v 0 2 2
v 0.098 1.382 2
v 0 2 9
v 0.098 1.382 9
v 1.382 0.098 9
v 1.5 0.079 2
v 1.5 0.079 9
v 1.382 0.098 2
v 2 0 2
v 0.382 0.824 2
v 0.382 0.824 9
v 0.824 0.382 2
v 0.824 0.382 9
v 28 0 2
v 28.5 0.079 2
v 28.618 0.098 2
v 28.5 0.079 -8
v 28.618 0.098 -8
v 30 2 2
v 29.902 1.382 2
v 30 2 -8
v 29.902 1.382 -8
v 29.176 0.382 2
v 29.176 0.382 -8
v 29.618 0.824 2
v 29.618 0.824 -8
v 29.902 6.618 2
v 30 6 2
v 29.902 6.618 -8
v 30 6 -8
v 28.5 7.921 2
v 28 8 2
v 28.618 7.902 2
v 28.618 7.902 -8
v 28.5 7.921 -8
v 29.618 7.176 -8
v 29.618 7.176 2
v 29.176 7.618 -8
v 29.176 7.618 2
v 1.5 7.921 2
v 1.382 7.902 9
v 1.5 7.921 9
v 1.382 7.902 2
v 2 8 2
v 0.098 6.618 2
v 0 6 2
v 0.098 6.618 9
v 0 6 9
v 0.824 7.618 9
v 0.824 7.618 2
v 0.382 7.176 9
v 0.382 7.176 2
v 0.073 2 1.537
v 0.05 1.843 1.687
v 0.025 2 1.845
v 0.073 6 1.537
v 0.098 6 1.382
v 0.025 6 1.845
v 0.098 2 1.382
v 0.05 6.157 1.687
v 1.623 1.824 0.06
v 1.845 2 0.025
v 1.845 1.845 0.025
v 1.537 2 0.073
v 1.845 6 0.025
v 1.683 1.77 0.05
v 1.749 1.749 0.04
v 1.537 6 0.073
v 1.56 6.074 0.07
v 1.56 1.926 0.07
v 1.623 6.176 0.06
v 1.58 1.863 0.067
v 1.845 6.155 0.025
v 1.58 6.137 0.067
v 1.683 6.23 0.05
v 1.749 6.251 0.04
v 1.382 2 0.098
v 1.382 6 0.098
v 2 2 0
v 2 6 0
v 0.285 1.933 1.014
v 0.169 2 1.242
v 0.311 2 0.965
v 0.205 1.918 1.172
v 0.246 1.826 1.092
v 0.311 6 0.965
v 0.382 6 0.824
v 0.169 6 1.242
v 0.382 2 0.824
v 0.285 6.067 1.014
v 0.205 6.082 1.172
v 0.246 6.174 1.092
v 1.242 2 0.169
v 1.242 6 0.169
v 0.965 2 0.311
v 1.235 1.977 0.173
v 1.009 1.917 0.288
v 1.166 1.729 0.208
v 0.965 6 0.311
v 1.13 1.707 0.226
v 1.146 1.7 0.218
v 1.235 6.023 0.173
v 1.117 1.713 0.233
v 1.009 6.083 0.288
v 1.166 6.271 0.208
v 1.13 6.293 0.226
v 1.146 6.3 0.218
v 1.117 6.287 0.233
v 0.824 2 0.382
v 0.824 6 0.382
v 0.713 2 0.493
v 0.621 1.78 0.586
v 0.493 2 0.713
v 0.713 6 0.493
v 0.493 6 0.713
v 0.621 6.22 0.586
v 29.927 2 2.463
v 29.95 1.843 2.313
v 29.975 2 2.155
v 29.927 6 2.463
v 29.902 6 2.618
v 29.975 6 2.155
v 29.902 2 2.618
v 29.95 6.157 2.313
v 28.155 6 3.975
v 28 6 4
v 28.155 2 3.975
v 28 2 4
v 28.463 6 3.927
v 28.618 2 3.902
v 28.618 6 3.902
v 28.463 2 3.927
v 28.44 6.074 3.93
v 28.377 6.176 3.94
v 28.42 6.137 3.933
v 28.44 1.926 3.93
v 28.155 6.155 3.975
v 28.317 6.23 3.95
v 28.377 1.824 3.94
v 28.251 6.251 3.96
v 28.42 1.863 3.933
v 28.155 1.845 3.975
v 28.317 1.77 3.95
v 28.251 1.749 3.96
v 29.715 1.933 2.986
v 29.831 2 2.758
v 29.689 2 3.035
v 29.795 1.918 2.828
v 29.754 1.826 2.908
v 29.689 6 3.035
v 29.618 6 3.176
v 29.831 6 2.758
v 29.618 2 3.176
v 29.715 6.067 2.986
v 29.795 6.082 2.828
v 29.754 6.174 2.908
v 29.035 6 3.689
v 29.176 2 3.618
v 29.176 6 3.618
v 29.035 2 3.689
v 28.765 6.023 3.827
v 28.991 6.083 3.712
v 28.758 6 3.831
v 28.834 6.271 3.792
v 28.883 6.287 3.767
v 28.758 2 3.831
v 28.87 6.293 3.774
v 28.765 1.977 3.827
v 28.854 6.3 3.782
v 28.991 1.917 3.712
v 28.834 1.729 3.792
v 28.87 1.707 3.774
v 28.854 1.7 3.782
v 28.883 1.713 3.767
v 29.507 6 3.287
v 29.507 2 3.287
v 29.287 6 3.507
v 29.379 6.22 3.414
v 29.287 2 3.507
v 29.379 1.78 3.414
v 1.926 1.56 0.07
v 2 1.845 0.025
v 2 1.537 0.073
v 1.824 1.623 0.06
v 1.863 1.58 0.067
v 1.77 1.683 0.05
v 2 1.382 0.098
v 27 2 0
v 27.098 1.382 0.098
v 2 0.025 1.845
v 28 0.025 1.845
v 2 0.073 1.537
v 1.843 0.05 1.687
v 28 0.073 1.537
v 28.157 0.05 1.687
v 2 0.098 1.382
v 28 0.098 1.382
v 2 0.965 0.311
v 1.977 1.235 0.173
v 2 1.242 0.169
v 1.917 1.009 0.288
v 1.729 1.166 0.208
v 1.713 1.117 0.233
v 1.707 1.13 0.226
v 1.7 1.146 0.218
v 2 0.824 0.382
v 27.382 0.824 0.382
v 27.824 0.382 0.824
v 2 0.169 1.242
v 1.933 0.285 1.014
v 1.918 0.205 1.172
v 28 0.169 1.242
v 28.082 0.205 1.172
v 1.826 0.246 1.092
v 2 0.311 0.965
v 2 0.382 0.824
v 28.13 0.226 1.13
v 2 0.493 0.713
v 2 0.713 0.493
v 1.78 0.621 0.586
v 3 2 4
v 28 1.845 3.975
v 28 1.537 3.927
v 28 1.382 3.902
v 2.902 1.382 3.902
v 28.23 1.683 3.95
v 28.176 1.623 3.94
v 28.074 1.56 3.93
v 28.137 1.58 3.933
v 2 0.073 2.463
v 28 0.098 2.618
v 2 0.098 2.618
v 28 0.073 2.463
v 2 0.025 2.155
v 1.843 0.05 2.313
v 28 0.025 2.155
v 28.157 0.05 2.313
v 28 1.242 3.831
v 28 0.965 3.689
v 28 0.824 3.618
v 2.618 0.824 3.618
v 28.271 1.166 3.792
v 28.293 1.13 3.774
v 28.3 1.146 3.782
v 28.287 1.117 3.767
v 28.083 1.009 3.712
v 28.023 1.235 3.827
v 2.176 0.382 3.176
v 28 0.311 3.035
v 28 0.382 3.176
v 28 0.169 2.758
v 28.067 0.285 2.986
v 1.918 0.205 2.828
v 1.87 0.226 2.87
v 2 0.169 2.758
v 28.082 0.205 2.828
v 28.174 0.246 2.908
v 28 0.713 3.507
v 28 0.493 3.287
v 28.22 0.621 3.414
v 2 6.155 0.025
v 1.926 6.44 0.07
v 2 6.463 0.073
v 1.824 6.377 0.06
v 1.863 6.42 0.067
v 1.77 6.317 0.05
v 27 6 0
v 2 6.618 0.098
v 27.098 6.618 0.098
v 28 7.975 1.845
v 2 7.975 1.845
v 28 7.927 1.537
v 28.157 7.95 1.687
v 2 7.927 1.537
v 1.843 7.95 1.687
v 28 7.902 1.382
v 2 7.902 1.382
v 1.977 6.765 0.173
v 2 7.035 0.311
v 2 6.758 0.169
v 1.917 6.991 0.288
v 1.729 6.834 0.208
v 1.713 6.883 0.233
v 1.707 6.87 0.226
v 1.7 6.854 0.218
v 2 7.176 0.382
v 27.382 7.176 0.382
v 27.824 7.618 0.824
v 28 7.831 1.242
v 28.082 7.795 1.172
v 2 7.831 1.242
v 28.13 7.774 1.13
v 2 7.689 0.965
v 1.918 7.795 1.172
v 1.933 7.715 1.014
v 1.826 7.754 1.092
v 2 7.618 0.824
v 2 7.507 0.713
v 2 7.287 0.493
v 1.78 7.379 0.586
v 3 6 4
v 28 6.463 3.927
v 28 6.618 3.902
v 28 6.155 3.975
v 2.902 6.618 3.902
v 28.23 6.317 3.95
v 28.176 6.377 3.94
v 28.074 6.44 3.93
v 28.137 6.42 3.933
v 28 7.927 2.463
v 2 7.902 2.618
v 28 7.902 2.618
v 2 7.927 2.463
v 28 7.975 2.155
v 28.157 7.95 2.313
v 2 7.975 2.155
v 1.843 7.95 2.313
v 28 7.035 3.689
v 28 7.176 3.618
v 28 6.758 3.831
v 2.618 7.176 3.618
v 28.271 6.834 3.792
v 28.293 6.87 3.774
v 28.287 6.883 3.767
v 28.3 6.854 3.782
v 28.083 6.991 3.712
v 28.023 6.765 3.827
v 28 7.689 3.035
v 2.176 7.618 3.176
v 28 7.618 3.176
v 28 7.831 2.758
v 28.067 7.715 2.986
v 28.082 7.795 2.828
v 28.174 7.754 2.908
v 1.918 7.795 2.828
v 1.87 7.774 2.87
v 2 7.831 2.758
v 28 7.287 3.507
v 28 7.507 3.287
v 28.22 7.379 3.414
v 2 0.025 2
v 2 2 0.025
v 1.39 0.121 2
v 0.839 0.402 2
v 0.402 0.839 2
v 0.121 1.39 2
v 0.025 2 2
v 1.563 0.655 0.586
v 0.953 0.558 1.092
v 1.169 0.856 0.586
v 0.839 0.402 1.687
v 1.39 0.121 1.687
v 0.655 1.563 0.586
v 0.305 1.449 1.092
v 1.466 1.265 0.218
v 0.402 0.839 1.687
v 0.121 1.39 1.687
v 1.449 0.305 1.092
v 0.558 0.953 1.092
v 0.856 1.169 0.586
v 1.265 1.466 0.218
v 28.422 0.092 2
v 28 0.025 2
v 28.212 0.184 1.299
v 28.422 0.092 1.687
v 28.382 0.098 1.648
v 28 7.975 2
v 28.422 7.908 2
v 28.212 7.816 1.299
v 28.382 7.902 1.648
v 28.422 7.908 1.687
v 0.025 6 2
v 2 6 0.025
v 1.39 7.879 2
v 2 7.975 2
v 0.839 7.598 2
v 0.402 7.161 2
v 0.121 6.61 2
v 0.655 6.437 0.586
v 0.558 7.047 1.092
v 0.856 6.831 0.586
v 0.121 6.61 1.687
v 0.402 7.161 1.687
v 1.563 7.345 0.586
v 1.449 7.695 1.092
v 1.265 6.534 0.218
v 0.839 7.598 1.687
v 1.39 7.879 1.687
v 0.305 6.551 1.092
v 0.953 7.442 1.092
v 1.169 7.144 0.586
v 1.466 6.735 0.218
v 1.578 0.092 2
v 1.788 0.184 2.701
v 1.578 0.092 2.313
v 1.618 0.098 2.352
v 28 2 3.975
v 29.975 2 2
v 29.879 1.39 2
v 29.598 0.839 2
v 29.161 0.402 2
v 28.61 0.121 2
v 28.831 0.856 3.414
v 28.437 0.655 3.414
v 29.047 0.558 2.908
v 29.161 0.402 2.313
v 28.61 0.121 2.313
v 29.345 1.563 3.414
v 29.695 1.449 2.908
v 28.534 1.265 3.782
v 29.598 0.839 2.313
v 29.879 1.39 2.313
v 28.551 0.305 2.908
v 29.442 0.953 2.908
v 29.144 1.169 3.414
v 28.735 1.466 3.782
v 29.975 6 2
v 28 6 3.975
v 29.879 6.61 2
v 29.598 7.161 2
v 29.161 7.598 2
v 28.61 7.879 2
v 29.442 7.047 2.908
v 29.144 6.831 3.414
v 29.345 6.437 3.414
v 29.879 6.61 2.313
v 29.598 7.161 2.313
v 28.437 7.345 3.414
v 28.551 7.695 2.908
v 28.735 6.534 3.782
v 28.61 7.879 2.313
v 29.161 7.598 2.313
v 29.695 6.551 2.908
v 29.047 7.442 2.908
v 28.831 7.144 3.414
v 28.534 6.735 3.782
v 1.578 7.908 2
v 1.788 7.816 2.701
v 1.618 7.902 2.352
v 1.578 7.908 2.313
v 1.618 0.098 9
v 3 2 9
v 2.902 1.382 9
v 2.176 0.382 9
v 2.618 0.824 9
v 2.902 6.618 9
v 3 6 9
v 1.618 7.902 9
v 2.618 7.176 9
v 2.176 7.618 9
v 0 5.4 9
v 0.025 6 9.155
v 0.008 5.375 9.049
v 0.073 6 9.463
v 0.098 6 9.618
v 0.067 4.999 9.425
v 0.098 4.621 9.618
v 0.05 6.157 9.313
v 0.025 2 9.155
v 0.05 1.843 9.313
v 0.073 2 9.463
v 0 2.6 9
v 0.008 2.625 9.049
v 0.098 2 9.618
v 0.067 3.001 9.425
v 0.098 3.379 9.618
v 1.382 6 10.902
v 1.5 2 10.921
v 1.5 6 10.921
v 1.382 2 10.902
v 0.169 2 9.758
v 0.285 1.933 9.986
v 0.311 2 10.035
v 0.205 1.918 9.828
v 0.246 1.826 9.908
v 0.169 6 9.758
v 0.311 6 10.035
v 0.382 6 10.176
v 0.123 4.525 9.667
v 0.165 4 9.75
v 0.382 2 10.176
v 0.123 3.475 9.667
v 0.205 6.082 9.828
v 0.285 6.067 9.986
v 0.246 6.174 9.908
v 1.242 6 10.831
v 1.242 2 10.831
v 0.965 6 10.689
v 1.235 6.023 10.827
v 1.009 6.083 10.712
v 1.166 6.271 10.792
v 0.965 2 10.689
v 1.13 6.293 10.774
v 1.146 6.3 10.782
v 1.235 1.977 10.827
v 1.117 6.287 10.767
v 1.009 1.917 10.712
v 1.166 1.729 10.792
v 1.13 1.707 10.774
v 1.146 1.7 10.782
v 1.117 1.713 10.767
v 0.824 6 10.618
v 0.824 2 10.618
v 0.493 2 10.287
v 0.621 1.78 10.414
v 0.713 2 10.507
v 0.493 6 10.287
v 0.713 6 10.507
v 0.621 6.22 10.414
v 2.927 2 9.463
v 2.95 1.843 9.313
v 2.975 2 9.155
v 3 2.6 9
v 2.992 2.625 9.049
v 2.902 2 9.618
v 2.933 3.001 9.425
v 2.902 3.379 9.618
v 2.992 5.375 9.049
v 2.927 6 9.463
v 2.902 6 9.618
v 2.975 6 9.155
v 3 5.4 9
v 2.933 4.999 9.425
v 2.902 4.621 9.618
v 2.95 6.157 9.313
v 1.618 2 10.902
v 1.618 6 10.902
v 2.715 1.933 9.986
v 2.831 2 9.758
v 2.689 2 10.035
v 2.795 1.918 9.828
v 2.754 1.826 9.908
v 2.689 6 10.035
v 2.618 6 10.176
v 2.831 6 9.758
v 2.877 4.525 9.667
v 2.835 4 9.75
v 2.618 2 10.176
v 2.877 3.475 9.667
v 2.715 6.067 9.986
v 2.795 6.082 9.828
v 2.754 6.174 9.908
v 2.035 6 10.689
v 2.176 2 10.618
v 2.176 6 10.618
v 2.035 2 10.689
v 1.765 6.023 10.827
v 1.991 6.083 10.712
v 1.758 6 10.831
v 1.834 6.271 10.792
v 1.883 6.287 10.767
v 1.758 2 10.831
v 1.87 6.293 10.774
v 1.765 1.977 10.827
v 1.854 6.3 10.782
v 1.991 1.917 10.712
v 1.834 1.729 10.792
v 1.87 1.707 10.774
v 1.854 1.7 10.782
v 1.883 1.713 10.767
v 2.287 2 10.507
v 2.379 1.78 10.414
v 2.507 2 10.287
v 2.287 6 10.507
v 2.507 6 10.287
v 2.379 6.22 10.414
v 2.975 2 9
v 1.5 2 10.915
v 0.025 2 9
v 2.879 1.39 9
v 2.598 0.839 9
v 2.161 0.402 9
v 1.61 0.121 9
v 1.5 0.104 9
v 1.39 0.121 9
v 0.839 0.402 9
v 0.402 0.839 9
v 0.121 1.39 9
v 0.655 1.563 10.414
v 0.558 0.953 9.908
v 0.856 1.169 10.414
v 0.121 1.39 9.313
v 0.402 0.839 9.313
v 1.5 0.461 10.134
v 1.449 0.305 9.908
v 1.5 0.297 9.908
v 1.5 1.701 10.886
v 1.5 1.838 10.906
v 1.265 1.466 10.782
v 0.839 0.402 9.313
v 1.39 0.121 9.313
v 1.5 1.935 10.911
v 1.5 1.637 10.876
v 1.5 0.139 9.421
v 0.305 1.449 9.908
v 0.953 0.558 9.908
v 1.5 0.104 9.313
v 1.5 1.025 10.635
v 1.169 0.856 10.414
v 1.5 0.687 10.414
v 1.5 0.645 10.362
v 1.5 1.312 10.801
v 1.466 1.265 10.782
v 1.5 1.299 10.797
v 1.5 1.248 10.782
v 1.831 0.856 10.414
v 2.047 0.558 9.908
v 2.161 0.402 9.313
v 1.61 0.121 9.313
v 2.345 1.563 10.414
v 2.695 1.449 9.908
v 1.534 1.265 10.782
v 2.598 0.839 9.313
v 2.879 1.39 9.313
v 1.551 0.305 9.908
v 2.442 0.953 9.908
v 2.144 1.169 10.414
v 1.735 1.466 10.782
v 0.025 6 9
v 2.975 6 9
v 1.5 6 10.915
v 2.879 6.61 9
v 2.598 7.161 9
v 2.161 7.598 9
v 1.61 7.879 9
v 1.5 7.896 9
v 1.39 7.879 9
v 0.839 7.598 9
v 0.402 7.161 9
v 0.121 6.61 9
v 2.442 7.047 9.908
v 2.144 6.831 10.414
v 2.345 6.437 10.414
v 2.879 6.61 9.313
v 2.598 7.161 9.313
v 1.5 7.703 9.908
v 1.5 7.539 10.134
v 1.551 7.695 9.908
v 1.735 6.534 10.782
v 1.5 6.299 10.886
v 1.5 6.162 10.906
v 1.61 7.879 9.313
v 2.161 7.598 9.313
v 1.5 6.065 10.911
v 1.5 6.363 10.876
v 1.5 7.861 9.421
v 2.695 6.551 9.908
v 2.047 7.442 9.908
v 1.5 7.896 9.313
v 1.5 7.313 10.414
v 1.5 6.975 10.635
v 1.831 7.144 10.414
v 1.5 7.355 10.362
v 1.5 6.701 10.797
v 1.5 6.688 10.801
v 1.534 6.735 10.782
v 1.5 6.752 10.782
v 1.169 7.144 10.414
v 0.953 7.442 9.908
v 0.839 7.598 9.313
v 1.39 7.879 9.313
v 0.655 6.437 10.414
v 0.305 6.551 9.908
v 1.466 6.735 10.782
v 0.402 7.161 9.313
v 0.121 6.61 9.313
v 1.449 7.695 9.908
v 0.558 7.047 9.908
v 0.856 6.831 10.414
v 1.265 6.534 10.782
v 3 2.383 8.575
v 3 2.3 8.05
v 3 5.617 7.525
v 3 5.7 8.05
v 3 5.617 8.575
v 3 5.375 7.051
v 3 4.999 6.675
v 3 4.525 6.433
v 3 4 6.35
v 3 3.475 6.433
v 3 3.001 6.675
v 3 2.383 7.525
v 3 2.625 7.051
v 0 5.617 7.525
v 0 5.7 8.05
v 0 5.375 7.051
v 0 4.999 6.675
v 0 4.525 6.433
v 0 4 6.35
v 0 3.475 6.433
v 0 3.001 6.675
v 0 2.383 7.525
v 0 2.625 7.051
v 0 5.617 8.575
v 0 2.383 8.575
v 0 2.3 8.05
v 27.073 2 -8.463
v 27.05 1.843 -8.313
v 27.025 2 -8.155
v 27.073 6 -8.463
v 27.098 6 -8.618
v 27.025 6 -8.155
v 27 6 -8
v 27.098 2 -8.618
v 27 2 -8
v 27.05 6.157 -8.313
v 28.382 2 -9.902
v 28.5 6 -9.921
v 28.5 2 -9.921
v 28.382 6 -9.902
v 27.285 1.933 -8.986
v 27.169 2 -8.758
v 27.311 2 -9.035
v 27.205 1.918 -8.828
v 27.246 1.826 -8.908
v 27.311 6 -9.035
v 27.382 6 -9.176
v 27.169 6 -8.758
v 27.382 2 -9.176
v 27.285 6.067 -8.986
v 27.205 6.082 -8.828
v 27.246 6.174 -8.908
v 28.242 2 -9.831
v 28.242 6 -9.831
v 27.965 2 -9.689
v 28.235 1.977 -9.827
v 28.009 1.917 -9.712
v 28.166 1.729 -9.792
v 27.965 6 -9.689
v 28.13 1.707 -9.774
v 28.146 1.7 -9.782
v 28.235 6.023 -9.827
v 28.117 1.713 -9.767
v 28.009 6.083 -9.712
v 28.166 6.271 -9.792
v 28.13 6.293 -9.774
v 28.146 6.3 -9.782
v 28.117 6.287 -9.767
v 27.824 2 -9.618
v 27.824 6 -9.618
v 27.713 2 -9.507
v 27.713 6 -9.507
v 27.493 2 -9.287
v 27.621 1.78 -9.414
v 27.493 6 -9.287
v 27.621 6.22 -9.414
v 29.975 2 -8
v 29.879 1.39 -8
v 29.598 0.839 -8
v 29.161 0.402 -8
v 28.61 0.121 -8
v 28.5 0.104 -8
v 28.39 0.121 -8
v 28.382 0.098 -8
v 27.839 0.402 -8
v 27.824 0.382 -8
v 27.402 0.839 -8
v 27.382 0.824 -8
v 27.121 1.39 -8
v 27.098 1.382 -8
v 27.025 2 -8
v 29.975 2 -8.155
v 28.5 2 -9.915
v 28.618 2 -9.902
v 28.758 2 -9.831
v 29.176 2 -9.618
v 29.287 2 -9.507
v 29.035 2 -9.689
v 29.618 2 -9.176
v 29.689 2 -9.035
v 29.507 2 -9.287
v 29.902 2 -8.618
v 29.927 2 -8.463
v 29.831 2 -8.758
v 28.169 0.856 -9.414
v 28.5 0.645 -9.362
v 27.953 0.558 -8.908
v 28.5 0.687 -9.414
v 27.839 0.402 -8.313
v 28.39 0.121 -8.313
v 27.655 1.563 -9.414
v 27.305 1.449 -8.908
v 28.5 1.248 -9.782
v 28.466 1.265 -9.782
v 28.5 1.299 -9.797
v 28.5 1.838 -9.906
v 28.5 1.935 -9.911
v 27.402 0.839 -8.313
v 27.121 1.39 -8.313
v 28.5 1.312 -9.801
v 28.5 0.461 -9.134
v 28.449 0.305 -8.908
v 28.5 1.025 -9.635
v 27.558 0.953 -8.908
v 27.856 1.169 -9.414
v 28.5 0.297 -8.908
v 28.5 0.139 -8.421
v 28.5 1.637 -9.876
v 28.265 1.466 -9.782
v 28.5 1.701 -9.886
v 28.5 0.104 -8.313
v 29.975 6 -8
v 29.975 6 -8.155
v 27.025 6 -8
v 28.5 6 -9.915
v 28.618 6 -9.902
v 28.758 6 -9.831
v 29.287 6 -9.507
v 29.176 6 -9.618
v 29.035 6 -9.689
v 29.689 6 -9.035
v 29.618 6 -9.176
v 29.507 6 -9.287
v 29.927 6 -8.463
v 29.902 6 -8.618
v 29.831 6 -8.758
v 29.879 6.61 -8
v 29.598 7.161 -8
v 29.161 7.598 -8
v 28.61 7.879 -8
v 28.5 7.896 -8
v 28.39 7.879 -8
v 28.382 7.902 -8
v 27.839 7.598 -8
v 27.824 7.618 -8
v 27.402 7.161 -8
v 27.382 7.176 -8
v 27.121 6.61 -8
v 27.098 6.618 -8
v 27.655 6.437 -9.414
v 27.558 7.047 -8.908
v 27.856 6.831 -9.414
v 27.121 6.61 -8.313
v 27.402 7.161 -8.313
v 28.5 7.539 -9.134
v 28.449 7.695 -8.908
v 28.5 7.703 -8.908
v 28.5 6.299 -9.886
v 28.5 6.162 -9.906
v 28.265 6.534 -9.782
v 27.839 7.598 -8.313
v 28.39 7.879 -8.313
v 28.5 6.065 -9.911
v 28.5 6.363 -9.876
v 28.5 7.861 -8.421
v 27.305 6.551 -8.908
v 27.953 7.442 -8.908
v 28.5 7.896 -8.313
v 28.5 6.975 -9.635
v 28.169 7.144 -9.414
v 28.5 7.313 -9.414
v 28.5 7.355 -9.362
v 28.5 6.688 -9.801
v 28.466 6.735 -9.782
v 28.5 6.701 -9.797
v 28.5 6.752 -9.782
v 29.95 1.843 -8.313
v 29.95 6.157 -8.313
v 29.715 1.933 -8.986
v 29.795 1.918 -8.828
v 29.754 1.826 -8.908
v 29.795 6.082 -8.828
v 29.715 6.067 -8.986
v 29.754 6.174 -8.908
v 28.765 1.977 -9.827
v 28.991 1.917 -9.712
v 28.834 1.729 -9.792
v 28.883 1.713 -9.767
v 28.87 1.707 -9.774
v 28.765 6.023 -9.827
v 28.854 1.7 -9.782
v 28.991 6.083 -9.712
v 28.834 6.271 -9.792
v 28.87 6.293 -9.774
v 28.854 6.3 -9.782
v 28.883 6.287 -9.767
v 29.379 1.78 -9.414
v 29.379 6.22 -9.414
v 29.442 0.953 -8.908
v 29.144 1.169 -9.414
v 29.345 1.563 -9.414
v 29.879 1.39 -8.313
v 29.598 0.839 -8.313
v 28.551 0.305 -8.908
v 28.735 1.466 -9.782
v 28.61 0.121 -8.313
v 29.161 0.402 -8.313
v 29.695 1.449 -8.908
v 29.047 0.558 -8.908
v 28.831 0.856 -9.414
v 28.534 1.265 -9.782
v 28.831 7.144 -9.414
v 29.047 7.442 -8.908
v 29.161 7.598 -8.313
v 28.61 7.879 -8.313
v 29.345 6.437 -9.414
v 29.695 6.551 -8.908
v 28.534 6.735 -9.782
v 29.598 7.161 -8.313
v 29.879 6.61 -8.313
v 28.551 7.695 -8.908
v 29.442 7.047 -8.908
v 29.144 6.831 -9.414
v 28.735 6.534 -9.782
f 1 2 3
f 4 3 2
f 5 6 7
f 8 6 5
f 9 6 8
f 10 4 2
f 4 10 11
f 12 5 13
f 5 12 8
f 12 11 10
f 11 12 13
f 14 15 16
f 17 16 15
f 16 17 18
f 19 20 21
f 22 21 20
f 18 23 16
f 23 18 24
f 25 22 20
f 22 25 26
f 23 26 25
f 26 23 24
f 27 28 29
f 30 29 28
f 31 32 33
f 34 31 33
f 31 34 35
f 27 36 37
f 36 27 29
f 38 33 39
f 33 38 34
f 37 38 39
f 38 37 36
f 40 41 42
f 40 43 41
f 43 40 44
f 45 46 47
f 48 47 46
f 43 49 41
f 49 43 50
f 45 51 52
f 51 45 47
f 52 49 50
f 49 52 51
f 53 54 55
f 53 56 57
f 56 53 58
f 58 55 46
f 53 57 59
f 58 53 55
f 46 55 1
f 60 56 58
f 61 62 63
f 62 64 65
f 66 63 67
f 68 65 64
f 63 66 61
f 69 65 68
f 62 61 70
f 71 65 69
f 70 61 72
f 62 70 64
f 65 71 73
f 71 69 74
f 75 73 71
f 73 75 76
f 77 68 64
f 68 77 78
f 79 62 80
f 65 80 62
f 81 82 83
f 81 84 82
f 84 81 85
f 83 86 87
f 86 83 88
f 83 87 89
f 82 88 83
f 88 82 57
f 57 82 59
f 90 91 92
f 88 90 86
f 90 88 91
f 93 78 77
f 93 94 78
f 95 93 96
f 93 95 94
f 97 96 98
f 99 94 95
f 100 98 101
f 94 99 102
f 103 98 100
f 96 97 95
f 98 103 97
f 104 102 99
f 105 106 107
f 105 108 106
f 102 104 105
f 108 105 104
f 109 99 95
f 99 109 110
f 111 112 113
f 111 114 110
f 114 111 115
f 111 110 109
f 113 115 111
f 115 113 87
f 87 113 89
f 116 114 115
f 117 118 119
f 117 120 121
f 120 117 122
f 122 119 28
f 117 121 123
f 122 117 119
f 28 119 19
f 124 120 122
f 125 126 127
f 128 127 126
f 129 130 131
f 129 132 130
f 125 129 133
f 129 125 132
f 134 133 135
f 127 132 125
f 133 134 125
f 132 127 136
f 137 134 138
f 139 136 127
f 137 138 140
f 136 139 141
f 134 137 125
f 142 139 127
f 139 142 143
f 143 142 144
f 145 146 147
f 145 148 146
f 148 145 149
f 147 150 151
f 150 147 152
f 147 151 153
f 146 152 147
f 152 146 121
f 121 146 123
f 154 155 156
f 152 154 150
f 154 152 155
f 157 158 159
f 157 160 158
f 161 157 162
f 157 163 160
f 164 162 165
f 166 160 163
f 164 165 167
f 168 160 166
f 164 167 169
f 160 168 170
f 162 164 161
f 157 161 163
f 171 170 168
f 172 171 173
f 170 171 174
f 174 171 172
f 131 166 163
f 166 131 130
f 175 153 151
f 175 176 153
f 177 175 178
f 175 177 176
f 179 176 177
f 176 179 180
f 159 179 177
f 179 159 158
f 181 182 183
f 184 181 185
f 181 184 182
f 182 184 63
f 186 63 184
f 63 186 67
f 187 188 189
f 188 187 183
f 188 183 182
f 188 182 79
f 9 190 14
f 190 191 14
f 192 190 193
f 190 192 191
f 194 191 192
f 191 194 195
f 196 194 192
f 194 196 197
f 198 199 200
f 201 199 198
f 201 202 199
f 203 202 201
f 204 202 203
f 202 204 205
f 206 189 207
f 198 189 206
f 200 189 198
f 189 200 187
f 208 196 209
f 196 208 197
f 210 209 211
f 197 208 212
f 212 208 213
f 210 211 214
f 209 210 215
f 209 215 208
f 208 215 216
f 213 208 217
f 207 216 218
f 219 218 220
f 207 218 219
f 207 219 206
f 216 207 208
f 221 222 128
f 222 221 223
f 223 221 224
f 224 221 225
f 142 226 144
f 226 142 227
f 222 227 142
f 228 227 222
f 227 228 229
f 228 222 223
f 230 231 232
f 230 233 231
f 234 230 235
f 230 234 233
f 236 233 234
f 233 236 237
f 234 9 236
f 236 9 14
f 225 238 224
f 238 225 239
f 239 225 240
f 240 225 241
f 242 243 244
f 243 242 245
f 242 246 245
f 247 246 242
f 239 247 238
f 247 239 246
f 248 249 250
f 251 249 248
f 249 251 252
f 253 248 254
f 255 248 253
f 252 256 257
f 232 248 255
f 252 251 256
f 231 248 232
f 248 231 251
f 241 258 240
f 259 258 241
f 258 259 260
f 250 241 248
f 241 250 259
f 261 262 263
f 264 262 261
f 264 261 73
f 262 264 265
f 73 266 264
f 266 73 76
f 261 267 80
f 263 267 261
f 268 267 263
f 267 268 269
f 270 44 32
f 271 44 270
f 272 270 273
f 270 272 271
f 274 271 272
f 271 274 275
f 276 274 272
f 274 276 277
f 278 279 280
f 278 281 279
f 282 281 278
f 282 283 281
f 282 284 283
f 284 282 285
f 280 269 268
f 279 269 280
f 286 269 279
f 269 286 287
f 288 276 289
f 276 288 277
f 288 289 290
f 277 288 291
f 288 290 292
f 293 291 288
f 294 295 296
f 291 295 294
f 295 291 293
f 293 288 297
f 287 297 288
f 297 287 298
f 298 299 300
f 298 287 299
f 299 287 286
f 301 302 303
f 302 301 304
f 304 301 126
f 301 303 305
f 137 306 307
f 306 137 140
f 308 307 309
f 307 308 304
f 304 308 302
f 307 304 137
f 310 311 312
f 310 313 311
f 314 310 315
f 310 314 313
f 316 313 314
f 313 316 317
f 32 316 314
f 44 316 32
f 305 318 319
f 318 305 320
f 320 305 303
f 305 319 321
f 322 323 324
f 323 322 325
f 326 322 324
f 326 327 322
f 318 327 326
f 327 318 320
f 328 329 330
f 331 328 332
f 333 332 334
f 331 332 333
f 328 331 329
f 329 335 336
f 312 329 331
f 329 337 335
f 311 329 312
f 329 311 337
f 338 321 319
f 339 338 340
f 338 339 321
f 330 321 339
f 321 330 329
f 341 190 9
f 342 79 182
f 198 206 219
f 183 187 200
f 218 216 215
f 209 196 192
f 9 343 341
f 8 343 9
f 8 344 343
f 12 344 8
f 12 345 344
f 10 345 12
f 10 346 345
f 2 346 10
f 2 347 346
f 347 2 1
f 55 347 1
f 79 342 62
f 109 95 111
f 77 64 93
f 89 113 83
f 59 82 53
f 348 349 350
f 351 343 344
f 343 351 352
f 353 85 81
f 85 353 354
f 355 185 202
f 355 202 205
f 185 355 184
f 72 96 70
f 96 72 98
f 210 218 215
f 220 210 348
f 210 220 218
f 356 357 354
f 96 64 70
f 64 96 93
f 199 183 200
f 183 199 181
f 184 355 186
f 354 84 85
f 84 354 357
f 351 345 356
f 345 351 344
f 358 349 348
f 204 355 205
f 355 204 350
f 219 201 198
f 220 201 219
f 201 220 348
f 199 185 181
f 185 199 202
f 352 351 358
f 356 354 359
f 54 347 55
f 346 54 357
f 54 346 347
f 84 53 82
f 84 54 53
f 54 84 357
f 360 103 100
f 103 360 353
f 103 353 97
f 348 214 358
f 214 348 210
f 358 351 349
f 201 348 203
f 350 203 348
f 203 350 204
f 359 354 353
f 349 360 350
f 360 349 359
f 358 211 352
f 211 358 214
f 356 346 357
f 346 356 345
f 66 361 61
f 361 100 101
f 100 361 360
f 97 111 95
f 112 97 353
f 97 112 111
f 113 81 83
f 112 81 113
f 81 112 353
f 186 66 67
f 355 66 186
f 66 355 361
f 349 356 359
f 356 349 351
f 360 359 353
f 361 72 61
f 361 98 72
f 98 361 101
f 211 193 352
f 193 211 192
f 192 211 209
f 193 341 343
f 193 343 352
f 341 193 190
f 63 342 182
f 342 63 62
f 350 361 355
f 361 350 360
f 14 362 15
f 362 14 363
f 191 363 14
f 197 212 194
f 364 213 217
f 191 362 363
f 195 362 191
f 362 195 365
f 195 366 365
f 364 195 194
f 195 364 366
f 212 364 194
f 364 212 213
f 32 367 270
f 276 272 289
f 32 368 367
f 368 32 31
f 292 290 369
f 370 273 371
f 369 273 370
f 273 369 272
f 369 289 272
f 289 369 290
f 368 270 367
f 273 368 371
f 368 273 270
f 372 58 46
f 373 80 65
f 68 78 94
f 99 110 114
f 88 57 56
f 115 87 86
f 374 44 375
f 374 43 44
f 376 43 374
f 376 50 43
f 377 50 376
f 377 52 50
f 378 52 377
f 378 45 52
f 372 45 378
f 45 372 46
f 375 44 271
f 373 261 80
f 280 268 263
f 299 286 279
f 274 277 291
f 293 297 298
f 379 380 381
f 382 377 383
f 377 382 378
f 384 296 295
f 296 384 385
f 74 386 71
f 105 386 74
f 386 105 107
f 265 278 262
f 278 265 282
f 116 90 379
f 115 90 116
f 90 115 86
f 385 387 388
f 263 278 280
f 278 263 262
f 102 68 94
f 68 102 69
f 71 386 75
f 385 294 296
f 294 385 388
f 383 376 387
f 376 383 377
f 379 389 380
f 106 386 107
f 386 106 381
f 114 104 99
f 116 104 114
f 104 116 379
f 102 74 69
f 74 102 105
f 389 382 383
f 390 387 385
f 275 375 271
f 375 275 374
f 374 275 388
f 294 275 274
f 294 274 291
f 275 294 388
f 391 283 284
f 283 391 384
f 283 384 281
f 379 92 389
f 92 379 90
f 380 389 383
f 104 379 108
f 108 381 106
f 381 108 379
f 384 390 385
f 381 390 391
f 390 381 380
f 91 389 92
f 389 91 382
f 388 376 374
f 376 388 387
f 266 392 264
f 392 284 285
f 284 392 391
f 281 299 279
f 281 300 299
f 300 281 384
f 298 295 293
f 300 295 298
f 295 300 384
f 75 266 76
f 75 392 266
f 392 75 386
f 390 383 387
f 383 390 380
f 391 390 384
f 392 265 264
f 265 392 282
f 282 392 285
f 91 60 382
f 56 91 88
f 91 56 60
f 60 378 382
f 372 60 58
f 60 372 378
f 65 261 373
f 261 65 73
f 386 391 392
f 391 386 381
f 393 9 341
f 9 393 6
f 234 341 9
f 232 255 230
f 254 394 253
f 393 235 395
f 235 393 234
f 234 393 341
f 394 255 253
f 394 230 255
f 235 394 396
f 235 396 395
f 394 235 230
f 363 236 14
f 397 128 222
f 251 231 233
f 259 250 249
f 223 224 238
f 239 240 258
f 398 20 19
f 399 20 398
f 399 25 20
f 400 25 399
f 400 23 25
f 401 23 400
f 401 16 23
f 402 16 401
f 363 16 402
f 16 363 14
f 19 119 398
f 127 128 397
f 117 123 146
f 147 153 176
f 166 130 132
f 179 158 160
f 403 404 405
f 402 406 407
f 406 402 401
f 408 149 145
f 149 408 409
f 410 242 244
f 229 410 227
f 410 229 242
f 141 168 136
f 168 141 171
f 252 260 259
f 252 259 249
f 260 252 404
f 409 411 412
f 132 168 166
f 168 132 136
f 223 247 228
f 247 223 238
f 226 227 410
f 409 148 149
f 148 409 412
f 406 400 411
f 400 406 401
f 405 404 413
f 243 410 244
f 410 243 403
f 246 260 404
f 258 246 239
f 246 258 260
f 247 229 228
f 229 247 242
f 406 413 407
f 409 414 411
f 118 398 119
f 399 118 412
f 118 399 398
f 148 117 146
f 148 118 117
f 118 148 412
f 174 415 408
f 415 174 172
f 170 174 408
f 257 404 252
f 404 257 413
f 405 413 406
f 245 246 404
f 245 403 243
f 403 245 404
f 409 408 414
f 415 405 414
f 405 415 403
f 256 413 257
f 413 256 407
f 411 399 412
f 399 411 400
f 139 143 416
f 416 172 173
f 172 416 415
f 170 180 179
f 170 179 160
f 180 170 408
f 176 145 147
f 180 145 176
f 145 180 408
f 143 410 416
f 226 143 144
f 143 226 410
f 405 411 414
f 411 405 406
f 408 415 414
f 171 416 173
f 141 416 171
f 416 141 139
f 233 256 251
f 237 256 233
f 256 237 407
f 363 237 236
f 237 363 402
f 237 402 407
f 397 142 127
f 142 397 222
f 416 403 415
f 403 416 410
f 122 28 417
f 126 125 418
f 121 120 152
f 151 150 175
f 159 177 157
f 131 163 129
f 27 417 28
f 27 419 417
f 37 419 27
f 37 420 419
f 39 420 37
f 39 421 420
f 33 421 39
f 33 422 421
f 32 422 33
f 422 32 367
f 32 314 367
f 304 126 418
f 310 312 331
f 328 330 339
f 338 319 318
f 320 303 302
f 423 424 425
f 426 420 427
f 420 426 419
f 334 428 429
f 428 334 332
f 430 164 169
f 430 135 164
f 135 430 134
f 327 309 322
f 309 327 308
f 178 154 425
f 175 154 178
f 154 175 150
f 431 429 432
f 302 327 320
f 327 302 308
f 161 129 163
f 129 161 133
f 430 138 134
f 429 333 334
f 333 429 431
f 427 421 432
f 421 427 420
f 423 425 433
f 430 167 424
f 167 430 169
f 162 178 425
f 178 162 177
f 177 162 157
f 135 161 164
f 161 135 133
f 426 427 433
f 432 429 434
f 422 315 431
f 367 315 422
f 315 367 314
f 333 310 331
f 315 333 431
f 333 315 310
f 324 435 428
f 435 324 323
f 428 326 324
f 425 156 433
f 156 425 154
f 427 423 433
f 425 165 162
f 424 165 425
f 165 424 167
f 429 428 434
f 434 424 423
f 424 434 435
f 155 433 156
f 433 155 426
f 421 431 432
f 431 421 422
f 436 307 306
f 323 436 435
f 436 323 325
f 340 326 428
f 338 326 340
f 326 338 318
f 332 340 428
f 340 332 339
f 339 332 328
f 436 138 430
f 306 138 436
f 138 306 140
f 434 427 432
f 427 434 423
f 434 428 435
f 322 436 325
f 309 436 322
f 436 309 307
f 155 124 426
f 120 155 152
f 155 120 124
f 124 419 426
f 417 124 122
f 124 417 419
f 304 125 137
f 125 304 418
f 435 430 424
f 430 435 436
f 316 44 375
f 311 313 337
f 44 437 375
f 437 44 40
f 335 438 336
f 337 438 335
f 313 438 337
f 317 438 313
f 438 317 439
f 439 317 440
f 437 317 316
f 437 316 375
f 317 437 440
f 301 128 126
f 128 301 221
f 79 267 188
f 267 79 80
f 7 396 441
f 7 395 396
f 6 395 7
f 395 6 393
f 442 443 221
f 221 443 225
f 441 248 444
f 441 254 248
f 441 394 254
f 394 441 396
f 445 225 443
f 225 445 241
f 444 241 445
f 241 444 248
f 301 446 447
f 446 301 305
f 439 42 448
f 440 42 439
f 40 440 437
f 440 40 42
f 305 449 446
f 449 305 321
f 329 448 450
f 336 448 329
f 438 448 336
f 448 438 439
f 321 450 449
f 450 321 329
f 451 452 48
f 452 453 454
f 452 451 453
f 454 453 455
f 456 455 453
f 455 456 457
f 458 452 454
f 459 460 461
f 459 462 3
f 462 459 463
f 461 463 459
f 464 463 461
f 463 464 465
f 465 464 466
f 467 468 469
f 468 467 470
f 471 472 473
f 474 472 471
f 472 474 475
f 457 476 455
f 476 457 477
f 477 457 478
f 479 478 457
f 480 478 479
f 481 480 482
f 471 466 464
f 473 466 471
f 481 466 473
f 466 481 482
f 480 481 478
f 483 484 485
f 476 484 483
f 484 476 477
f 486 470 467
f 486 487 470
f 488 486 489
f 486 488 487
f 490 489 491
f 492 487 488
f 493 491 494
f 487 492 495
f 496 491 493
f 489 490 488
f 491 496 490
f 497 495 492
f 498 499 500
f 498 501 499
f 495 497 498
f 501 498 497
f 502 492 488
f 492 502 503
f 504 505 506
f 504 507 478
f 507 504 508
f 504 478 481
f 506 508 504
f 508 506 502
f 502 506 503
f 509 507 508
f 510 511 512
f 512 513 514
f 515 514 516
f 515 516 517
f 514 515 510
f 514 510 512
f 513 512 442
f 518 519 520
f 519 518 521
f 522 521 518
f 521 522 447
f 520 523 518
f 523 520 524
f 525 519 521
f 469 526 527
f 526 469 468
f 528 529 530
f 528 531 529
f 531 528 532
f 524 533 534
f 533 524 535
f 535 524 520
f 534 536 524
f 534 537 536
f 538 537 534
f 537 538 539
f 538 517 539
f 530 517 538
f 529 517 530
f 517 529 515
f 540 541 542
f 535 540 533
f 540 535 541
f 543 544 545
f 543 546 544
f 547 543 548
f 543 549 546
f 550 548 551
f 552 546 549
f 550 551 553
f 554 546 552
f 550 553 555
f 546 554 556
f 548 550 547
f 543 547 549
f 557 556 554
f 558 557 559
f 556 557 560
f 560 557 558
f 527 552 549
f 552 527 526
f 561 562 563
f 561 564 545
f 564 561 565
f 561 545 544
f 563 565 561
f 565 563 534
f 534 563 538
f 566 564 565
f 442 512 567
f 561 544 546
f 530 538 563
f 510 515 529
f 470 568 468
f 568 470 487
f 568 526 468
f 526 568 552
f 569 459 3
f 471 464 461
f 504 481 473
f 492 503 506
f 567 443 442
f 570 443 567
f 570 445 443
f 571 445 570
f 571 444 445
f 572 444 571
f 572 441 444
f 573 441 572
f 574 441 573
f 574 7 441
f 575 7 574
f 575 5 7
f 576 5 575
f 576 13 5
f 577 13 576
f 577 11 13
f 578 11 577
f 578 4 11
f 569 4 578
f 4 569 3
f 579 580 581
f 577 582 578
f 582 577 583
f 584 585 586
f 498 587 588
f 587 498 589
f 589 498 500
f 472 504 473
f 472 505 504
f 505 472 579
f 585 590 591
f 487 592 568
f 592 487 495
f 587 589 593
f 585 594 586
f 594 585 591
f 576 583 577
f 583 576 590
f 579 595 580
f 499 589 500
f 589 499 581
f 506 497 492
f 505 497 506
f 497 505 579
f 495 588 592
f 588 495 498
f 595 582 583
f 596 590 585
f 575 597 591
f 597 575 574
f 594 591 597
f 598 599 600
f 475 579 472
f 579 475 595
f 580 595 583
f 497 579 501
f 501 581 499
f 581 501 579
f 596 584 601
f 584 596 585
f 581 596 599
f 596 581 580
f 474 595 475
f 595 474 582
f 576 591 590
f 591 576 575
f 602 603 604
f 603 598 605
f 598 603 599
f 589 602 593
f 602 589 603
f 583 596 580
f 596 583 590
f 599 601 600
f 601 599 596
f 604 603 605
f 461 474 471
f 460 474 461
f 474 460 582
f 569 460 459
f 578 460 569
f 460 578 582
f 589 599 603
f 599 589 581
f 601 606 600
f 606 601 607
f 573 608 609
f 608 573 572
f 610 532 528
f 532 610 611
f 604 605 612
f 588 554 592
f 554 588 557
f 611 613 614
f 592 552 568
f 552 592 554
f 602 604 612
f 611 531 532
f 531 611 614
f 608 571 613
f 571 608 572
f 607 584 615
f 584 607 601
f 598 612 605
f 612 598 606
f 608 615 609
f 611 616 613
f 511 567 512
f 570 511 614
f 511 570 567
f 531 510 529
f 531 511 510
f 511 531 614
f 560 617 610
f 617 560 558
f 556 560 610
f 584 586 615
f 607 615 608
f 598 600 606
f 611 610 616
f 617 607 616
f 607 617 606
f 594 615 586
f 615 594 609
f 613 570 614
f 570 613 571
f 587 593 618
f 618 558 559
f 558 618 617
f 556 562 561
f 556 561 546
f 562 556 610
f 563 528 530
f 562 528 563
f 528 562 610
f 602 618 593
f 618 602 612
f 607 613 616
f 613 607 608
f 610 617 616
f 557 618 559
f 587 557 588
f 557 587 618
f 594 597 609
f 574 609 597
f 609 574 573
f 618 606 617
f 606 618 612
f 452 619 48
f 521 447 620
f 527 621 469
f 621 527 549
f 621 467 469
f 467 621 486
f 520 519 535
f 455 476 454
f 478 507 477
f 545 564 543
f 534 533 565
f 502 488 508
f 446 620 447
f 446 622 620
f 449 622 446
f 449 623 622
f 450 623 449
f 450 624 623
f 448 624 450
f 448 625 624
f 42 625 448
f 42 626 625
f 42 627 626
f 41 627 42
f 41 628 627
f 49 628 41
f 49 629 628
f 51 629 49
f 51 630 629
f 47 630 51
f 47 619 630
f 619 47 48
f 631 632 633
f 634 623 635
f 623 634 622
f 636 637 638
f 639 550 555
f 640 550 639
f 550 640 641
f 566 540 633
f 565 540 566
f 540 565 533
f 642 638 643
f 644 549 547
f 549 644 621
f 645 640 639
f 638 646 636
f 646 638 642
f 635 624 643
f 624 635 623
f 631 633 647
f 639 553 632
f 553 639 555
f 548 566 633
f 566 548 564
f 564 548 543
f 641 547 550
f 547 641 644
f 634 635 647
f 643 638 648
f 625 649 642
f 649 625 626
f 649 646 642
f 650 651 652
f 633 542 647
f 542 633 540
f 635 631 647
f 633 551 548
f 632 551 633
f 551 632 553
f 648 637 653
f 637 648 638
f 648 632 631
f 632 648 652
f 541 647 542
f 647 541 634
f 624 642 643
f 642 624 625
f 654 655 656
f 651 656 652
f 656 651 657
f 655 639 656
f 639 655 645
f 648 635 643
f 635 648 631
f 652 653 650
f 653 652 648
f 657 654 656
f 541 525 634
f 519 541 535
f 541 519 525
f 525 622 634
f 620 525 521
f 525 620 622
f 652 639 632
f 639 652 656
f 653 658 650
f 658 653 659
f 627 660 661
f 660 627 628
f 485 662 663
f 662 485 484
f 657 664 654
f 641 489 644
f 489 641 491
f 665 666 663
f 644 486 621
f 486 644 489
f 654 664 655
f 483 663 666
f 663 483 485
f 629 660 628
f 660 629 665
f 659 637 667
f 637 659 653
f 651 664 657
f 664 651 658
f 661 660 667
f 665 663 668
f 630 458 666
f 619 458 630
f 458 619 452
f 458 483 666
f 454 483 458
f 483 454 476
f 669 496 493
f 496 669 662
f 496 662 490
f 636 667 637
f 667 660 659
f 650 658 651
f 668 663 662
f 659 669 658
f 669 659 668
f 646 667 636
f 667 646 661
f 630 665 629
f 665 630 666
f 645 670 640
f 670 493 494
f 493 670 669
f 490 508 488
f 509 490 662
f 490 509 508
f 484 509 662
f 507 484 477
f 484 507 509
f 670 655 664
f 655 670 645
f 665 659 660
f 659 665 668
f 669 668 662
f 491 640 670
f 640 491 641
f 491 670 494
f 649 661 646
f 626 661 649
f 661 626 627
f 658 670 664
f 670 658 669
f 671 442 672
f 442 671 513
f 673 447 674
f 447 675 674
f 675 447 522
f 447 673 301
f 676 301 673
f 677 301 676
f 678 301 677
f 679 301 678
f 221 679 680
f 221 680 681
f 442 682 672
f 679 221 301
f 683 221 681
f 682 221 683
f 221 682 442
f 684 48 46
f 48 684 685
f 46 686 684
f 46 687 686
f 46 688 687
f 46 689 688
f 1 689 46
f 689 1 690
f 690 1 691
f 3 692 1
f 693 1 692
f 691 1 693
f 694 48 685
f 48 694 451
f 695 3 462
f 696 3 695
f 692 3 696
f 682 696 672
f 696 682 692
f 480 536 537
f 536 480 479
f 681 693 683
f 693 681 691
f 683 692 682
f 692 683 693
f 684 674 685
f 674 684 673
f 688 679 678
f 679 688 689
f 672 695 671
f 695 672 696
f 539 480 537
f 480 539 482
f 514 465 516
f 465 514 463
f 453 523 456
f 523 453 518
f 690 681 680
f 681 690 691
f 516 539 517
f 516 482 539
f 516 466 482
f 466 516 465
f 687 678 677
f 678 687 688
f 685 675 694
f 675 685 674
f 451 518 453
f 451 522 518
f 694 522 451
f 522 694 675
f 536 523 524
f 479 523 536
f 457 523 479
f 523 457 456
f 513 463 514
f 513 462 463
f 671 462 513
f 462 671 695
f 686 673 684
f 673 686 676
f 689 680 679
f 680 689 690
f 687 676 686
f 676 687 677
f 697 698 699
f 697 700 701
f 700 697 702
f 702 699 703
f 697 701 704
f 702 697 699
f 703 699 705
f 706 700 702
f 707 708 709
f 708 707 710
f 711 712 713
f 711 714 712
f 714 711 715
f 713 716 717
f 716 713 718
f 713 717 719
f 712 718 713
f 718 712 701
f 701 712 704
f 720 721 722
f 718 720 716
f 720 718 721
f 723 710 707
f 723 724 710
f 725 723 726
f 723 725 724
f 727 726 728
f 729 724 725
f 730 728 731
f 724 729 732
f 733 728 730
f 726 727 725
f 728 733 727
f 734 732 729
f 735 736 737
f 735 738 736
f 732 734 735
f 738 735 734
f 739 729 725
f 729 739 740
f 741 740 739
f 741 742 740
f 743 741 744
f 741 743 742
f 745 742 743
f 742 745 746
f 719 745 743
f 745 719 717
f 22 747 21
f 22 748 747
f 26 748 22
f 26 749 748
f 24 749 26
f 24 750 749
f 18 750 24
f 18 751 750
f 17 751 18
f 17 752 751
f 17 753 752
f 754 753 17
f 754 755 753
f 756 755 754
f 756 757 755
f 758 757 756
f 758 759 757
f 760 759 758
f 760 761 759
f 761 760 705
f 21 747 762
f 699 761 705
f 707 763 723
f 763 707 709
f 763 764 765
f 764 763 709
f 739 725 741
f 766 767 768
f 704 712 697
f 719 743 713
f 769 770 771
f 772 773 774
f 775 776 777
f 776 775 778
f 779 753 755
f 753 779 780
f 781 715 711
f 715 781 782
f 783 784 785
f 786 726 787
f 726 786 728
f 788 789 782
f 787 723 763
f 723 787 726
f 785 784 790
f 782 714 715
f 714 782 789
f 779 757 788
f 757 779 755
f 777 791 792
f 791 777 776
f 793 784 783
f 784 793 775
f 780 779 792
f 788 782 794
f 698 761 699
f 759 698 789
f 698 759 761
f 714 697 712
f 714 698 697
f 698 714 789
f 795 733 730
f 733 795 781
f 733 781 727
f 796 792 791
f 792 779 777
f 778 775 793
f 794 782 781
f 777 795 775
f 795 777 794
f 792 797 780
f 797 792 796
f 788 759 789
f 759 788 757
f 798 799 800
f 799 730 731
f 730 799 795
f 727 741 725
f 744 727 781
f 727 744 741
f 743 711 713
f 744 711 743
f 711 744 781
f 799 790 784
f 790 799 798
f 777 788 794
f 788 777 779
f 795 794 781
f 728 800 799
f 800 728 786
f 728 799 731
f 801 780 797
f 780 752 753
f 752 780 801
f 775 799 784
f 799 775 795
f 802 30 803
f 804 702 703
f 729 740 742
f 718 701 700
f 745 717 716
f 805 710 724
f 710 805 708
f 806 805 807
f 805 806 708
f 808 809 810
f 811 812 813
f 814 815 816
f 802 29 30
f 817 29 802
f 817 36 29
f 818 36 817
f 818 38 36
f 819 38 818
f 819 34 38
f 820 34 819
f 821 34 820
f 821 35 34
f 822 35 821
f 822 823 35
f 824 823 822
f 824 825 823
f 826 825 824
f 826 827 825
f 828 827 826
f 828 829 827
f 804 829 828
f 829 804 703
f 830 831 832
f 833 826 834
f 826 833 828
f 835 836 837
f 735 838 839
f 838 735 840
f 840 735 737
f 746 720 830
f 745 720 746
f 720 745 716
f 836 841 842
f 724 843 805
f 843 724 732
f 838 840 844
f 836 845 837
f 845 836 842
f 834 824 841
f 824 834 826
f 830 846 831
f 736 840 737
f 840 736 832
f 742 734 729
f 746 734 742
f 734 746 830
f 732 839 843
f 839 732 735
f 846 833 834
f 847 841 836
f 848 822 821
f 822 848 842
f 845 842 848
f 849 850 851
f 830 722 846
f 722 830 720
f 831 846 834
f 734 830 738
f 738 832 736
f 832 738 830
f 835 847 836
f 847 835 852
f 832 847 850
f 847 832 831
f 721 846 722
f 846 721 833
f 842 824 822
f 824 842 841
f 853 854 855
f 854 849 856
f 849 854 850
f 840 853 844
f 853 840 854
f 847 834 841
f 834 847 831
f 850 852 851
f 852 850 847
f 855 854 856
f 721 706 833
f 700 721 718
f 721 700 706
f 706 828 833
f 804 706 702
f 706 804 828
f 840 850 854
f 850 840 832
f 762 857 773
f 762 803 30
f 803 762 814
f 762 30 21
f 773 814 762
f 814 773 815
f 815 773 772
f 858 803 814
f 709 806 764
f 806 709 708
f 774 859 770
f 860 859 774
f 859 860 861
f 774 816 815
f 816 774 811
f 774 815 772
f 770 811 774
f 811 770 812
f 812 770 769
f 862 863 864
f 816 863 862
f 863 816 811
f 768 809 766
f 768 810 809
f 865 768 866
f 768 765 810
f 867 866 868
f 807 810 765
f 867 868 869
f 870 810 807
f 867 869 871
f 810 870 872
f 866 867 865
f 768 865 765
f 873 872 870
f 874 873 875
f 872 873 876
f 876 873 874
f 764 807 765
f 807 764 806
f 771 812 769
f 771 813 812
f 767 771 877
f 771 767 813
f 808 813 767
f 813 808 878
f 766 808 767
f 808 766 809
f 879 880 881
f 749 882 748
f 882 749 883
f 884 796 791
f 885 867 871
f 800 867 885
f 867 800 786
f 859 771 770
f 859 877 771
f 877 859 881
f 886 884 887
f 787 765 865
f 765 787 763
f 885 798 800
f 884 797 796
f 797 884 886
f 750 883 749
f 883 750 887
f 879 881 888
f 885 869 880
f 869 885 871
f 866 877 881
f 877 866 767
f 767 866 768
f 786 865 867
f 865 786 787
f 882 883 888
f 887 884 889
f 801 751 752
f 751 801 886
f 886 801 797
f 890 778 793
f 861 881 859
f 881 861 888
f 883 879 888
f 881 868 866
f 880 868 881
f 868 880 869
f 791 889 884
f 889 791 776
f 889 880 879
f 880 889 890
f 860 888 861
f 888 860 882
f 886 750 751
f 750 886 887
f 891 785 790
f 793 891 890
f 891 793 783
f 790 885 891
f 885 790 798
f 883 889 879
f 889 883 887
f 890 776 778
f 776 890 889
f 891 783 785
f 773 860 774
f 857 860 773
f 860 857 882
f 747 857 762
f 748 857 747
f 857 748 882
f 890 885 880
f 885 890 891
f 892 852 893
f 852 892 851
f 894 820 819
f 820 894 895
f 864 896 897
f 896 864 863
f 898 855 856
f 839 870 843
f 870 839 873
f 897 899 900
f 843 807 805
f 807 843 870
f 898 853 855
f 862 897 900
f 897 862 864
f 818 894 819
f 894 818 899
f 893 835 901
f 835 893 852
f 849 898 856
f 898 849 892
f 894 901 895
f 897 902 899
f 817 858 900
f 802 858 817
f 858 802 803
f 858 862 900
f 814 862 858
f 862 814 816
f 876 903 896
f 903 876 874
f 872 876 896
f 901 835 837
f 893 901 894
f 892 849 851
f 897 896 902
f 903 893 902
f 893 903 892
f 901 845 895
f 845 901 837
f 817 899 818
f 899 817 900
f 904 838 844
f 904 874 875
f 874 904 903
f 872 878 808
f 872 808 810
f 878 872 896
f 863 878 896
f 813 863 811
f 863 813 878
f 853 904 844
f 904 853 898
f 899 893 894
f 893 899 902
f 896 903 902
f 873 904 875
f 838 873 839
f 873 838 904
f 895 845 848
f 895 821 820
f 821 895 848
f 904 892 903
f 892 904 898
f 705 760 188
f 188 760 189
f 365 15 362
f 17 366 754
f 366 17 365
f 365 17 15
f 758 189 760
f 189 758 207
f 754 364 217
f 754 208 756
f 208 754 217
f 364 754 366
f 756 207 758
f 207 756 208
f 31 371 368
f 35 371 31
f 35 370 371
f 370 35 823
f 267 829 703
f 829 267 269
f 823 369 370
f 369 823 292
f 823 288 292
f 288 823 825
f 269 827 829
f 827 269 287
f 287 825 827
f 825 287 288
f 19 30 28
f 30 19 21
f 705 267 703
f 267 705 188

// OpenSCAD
el = 1e-2;
fn = 20;

module rcorner ( r )
{
   difference() {
      translate ( -el * [ 1, 1, 1 ] ) cube( r + el );
      translate ( [ r, r, r ] ) sphere( r, $fn = fn );
   }
}

module redge ( r, l )
{
   difference() {
      translate ( -2 * el * [ 1, 1, 1 ] ) cube( [ r + 2 * el, r + 2 * el, l + 4 * el ] );
      translate ( [ r, r, -el ] ) cylinder( r = r, h = l + 2 * el, $fn = fn );
   }
}

module rcube( size = 1, center = false, r = 0 )
{
        sz = len( size ) == undef ? [ size, size, size ] : size;

        difference() {
                cube( size = sz );
                union (){
                        // Round the edges:

                        redge( r ,sz[2] );
                        translate( [ sz[0], 0, 0 ] ) rotate( 90, [ 0, 0, 1 ] ) redge( r ,sz[2] );
                        translate( [ sz[0], sz[1], 0 ] ) rotate( 180, [ 0, 0, 1 ] ) redge( r ,sz[2] );
                        translate( [ 0, sz[1], 0 ] ) rotate( 270, [ 0, 0, 1 ] ) redge( r ,sz[2] );

                        translate( [ 0, sz[1], 0 ] ) rotate ( 90, [ 1, 0, 0 ] ) redge( r ,sz[1] );
                        translate( [ 0, 0, sz[2] ] ) rotate ( -90, [ 1, 0, 0 ] ) redge( r ,sz[1] );
                        translate( [ sz[0], 0, 0 ] ) rotate ( 180, [ 0, 1, 1 ] ) redge( r ,sz[1] );
                        translate( [ sz[0], sz[1], sz[2] ] ) rotate ( 180, [ 0, 1, -1 ] ) redge( r ,sz[1] );

                        translate( [ sz[0], 0, 0 ] ) rotate( -90, [ 0, 1, 0 ] )  redge( r ,sz[0] );
                        translate( [ 0, 0, sz[2] ] ) rotate( 90, [ 0, 1, 0 ] )  redge( r ,sz[0] );
                        translate( [ 0, sz[1], 0 ] ) rotate( 180, [ 1, 0, 1 ] )  redge( r ,sz[0] );
                        translate( [ sz[0], sz[1], sz[2] ] ) rotate( 180, [ 1, 0, -1 ] )  redge( r ,sz[0] );

                        // Round the corners:
                        rcorner( r );
                        translate( [ sz[0], 0, 0 ] ) rotate( 90, [ 0, 0, 1 ] ) rcorner( r );
                        translate( [ sz[0], sz[1], 0 ] ) rotate( 180, [ 0, 0, 1 ] ) rcorner( r );
                        translate( [ 0, sz[1], 0 ] ) rotate( 270, [ 0, 0, 1 ] ) rcorner( r );

                        translate( [ 0, 0, sz[2] ] ) rotate( 90, [ 0, 0, 1 ] ) rotate( 180, [ 1, 0, 0 ] ) rcorner( r );
                        translate( [ sz[0], 0, sz[2] ] ) rotate( 180, [ 0, 0, 1 ] ) rotate( 180, [ 1, 0, 0 ] ) rcorner( r );
                        translate( [ sz[0], sz[1], sz[2] ] ) rotate( 270, [ 0, 0, 1 ] ) rotate( 180, [ 1, 0, 0 ] ) rcorner( r );
                        translate( [ 0, sz[1], sz[2] ] ) rotate( 180, [ 1, 0, 0 ] ) rcorner( r );

                }
        }
}

render( convexity = 10 ){
    rcube( [ 30, 8, 4 ], r = 2 );
    difference(){
        rcube( [ 3, 8, 11 ], r = 2 );
        translate( [ -5, 4, 10 - 1.7 - 0.25 ] )
            rotate( 90, [ 0, 1, 0 ] )
                cylinder( r = 1.7, h = 10, $fn = 20 );
    }
    translate( [ 27, 0, -10 ] )
        rcube( [ 3, 8, 14 ], r = 2 );
}
